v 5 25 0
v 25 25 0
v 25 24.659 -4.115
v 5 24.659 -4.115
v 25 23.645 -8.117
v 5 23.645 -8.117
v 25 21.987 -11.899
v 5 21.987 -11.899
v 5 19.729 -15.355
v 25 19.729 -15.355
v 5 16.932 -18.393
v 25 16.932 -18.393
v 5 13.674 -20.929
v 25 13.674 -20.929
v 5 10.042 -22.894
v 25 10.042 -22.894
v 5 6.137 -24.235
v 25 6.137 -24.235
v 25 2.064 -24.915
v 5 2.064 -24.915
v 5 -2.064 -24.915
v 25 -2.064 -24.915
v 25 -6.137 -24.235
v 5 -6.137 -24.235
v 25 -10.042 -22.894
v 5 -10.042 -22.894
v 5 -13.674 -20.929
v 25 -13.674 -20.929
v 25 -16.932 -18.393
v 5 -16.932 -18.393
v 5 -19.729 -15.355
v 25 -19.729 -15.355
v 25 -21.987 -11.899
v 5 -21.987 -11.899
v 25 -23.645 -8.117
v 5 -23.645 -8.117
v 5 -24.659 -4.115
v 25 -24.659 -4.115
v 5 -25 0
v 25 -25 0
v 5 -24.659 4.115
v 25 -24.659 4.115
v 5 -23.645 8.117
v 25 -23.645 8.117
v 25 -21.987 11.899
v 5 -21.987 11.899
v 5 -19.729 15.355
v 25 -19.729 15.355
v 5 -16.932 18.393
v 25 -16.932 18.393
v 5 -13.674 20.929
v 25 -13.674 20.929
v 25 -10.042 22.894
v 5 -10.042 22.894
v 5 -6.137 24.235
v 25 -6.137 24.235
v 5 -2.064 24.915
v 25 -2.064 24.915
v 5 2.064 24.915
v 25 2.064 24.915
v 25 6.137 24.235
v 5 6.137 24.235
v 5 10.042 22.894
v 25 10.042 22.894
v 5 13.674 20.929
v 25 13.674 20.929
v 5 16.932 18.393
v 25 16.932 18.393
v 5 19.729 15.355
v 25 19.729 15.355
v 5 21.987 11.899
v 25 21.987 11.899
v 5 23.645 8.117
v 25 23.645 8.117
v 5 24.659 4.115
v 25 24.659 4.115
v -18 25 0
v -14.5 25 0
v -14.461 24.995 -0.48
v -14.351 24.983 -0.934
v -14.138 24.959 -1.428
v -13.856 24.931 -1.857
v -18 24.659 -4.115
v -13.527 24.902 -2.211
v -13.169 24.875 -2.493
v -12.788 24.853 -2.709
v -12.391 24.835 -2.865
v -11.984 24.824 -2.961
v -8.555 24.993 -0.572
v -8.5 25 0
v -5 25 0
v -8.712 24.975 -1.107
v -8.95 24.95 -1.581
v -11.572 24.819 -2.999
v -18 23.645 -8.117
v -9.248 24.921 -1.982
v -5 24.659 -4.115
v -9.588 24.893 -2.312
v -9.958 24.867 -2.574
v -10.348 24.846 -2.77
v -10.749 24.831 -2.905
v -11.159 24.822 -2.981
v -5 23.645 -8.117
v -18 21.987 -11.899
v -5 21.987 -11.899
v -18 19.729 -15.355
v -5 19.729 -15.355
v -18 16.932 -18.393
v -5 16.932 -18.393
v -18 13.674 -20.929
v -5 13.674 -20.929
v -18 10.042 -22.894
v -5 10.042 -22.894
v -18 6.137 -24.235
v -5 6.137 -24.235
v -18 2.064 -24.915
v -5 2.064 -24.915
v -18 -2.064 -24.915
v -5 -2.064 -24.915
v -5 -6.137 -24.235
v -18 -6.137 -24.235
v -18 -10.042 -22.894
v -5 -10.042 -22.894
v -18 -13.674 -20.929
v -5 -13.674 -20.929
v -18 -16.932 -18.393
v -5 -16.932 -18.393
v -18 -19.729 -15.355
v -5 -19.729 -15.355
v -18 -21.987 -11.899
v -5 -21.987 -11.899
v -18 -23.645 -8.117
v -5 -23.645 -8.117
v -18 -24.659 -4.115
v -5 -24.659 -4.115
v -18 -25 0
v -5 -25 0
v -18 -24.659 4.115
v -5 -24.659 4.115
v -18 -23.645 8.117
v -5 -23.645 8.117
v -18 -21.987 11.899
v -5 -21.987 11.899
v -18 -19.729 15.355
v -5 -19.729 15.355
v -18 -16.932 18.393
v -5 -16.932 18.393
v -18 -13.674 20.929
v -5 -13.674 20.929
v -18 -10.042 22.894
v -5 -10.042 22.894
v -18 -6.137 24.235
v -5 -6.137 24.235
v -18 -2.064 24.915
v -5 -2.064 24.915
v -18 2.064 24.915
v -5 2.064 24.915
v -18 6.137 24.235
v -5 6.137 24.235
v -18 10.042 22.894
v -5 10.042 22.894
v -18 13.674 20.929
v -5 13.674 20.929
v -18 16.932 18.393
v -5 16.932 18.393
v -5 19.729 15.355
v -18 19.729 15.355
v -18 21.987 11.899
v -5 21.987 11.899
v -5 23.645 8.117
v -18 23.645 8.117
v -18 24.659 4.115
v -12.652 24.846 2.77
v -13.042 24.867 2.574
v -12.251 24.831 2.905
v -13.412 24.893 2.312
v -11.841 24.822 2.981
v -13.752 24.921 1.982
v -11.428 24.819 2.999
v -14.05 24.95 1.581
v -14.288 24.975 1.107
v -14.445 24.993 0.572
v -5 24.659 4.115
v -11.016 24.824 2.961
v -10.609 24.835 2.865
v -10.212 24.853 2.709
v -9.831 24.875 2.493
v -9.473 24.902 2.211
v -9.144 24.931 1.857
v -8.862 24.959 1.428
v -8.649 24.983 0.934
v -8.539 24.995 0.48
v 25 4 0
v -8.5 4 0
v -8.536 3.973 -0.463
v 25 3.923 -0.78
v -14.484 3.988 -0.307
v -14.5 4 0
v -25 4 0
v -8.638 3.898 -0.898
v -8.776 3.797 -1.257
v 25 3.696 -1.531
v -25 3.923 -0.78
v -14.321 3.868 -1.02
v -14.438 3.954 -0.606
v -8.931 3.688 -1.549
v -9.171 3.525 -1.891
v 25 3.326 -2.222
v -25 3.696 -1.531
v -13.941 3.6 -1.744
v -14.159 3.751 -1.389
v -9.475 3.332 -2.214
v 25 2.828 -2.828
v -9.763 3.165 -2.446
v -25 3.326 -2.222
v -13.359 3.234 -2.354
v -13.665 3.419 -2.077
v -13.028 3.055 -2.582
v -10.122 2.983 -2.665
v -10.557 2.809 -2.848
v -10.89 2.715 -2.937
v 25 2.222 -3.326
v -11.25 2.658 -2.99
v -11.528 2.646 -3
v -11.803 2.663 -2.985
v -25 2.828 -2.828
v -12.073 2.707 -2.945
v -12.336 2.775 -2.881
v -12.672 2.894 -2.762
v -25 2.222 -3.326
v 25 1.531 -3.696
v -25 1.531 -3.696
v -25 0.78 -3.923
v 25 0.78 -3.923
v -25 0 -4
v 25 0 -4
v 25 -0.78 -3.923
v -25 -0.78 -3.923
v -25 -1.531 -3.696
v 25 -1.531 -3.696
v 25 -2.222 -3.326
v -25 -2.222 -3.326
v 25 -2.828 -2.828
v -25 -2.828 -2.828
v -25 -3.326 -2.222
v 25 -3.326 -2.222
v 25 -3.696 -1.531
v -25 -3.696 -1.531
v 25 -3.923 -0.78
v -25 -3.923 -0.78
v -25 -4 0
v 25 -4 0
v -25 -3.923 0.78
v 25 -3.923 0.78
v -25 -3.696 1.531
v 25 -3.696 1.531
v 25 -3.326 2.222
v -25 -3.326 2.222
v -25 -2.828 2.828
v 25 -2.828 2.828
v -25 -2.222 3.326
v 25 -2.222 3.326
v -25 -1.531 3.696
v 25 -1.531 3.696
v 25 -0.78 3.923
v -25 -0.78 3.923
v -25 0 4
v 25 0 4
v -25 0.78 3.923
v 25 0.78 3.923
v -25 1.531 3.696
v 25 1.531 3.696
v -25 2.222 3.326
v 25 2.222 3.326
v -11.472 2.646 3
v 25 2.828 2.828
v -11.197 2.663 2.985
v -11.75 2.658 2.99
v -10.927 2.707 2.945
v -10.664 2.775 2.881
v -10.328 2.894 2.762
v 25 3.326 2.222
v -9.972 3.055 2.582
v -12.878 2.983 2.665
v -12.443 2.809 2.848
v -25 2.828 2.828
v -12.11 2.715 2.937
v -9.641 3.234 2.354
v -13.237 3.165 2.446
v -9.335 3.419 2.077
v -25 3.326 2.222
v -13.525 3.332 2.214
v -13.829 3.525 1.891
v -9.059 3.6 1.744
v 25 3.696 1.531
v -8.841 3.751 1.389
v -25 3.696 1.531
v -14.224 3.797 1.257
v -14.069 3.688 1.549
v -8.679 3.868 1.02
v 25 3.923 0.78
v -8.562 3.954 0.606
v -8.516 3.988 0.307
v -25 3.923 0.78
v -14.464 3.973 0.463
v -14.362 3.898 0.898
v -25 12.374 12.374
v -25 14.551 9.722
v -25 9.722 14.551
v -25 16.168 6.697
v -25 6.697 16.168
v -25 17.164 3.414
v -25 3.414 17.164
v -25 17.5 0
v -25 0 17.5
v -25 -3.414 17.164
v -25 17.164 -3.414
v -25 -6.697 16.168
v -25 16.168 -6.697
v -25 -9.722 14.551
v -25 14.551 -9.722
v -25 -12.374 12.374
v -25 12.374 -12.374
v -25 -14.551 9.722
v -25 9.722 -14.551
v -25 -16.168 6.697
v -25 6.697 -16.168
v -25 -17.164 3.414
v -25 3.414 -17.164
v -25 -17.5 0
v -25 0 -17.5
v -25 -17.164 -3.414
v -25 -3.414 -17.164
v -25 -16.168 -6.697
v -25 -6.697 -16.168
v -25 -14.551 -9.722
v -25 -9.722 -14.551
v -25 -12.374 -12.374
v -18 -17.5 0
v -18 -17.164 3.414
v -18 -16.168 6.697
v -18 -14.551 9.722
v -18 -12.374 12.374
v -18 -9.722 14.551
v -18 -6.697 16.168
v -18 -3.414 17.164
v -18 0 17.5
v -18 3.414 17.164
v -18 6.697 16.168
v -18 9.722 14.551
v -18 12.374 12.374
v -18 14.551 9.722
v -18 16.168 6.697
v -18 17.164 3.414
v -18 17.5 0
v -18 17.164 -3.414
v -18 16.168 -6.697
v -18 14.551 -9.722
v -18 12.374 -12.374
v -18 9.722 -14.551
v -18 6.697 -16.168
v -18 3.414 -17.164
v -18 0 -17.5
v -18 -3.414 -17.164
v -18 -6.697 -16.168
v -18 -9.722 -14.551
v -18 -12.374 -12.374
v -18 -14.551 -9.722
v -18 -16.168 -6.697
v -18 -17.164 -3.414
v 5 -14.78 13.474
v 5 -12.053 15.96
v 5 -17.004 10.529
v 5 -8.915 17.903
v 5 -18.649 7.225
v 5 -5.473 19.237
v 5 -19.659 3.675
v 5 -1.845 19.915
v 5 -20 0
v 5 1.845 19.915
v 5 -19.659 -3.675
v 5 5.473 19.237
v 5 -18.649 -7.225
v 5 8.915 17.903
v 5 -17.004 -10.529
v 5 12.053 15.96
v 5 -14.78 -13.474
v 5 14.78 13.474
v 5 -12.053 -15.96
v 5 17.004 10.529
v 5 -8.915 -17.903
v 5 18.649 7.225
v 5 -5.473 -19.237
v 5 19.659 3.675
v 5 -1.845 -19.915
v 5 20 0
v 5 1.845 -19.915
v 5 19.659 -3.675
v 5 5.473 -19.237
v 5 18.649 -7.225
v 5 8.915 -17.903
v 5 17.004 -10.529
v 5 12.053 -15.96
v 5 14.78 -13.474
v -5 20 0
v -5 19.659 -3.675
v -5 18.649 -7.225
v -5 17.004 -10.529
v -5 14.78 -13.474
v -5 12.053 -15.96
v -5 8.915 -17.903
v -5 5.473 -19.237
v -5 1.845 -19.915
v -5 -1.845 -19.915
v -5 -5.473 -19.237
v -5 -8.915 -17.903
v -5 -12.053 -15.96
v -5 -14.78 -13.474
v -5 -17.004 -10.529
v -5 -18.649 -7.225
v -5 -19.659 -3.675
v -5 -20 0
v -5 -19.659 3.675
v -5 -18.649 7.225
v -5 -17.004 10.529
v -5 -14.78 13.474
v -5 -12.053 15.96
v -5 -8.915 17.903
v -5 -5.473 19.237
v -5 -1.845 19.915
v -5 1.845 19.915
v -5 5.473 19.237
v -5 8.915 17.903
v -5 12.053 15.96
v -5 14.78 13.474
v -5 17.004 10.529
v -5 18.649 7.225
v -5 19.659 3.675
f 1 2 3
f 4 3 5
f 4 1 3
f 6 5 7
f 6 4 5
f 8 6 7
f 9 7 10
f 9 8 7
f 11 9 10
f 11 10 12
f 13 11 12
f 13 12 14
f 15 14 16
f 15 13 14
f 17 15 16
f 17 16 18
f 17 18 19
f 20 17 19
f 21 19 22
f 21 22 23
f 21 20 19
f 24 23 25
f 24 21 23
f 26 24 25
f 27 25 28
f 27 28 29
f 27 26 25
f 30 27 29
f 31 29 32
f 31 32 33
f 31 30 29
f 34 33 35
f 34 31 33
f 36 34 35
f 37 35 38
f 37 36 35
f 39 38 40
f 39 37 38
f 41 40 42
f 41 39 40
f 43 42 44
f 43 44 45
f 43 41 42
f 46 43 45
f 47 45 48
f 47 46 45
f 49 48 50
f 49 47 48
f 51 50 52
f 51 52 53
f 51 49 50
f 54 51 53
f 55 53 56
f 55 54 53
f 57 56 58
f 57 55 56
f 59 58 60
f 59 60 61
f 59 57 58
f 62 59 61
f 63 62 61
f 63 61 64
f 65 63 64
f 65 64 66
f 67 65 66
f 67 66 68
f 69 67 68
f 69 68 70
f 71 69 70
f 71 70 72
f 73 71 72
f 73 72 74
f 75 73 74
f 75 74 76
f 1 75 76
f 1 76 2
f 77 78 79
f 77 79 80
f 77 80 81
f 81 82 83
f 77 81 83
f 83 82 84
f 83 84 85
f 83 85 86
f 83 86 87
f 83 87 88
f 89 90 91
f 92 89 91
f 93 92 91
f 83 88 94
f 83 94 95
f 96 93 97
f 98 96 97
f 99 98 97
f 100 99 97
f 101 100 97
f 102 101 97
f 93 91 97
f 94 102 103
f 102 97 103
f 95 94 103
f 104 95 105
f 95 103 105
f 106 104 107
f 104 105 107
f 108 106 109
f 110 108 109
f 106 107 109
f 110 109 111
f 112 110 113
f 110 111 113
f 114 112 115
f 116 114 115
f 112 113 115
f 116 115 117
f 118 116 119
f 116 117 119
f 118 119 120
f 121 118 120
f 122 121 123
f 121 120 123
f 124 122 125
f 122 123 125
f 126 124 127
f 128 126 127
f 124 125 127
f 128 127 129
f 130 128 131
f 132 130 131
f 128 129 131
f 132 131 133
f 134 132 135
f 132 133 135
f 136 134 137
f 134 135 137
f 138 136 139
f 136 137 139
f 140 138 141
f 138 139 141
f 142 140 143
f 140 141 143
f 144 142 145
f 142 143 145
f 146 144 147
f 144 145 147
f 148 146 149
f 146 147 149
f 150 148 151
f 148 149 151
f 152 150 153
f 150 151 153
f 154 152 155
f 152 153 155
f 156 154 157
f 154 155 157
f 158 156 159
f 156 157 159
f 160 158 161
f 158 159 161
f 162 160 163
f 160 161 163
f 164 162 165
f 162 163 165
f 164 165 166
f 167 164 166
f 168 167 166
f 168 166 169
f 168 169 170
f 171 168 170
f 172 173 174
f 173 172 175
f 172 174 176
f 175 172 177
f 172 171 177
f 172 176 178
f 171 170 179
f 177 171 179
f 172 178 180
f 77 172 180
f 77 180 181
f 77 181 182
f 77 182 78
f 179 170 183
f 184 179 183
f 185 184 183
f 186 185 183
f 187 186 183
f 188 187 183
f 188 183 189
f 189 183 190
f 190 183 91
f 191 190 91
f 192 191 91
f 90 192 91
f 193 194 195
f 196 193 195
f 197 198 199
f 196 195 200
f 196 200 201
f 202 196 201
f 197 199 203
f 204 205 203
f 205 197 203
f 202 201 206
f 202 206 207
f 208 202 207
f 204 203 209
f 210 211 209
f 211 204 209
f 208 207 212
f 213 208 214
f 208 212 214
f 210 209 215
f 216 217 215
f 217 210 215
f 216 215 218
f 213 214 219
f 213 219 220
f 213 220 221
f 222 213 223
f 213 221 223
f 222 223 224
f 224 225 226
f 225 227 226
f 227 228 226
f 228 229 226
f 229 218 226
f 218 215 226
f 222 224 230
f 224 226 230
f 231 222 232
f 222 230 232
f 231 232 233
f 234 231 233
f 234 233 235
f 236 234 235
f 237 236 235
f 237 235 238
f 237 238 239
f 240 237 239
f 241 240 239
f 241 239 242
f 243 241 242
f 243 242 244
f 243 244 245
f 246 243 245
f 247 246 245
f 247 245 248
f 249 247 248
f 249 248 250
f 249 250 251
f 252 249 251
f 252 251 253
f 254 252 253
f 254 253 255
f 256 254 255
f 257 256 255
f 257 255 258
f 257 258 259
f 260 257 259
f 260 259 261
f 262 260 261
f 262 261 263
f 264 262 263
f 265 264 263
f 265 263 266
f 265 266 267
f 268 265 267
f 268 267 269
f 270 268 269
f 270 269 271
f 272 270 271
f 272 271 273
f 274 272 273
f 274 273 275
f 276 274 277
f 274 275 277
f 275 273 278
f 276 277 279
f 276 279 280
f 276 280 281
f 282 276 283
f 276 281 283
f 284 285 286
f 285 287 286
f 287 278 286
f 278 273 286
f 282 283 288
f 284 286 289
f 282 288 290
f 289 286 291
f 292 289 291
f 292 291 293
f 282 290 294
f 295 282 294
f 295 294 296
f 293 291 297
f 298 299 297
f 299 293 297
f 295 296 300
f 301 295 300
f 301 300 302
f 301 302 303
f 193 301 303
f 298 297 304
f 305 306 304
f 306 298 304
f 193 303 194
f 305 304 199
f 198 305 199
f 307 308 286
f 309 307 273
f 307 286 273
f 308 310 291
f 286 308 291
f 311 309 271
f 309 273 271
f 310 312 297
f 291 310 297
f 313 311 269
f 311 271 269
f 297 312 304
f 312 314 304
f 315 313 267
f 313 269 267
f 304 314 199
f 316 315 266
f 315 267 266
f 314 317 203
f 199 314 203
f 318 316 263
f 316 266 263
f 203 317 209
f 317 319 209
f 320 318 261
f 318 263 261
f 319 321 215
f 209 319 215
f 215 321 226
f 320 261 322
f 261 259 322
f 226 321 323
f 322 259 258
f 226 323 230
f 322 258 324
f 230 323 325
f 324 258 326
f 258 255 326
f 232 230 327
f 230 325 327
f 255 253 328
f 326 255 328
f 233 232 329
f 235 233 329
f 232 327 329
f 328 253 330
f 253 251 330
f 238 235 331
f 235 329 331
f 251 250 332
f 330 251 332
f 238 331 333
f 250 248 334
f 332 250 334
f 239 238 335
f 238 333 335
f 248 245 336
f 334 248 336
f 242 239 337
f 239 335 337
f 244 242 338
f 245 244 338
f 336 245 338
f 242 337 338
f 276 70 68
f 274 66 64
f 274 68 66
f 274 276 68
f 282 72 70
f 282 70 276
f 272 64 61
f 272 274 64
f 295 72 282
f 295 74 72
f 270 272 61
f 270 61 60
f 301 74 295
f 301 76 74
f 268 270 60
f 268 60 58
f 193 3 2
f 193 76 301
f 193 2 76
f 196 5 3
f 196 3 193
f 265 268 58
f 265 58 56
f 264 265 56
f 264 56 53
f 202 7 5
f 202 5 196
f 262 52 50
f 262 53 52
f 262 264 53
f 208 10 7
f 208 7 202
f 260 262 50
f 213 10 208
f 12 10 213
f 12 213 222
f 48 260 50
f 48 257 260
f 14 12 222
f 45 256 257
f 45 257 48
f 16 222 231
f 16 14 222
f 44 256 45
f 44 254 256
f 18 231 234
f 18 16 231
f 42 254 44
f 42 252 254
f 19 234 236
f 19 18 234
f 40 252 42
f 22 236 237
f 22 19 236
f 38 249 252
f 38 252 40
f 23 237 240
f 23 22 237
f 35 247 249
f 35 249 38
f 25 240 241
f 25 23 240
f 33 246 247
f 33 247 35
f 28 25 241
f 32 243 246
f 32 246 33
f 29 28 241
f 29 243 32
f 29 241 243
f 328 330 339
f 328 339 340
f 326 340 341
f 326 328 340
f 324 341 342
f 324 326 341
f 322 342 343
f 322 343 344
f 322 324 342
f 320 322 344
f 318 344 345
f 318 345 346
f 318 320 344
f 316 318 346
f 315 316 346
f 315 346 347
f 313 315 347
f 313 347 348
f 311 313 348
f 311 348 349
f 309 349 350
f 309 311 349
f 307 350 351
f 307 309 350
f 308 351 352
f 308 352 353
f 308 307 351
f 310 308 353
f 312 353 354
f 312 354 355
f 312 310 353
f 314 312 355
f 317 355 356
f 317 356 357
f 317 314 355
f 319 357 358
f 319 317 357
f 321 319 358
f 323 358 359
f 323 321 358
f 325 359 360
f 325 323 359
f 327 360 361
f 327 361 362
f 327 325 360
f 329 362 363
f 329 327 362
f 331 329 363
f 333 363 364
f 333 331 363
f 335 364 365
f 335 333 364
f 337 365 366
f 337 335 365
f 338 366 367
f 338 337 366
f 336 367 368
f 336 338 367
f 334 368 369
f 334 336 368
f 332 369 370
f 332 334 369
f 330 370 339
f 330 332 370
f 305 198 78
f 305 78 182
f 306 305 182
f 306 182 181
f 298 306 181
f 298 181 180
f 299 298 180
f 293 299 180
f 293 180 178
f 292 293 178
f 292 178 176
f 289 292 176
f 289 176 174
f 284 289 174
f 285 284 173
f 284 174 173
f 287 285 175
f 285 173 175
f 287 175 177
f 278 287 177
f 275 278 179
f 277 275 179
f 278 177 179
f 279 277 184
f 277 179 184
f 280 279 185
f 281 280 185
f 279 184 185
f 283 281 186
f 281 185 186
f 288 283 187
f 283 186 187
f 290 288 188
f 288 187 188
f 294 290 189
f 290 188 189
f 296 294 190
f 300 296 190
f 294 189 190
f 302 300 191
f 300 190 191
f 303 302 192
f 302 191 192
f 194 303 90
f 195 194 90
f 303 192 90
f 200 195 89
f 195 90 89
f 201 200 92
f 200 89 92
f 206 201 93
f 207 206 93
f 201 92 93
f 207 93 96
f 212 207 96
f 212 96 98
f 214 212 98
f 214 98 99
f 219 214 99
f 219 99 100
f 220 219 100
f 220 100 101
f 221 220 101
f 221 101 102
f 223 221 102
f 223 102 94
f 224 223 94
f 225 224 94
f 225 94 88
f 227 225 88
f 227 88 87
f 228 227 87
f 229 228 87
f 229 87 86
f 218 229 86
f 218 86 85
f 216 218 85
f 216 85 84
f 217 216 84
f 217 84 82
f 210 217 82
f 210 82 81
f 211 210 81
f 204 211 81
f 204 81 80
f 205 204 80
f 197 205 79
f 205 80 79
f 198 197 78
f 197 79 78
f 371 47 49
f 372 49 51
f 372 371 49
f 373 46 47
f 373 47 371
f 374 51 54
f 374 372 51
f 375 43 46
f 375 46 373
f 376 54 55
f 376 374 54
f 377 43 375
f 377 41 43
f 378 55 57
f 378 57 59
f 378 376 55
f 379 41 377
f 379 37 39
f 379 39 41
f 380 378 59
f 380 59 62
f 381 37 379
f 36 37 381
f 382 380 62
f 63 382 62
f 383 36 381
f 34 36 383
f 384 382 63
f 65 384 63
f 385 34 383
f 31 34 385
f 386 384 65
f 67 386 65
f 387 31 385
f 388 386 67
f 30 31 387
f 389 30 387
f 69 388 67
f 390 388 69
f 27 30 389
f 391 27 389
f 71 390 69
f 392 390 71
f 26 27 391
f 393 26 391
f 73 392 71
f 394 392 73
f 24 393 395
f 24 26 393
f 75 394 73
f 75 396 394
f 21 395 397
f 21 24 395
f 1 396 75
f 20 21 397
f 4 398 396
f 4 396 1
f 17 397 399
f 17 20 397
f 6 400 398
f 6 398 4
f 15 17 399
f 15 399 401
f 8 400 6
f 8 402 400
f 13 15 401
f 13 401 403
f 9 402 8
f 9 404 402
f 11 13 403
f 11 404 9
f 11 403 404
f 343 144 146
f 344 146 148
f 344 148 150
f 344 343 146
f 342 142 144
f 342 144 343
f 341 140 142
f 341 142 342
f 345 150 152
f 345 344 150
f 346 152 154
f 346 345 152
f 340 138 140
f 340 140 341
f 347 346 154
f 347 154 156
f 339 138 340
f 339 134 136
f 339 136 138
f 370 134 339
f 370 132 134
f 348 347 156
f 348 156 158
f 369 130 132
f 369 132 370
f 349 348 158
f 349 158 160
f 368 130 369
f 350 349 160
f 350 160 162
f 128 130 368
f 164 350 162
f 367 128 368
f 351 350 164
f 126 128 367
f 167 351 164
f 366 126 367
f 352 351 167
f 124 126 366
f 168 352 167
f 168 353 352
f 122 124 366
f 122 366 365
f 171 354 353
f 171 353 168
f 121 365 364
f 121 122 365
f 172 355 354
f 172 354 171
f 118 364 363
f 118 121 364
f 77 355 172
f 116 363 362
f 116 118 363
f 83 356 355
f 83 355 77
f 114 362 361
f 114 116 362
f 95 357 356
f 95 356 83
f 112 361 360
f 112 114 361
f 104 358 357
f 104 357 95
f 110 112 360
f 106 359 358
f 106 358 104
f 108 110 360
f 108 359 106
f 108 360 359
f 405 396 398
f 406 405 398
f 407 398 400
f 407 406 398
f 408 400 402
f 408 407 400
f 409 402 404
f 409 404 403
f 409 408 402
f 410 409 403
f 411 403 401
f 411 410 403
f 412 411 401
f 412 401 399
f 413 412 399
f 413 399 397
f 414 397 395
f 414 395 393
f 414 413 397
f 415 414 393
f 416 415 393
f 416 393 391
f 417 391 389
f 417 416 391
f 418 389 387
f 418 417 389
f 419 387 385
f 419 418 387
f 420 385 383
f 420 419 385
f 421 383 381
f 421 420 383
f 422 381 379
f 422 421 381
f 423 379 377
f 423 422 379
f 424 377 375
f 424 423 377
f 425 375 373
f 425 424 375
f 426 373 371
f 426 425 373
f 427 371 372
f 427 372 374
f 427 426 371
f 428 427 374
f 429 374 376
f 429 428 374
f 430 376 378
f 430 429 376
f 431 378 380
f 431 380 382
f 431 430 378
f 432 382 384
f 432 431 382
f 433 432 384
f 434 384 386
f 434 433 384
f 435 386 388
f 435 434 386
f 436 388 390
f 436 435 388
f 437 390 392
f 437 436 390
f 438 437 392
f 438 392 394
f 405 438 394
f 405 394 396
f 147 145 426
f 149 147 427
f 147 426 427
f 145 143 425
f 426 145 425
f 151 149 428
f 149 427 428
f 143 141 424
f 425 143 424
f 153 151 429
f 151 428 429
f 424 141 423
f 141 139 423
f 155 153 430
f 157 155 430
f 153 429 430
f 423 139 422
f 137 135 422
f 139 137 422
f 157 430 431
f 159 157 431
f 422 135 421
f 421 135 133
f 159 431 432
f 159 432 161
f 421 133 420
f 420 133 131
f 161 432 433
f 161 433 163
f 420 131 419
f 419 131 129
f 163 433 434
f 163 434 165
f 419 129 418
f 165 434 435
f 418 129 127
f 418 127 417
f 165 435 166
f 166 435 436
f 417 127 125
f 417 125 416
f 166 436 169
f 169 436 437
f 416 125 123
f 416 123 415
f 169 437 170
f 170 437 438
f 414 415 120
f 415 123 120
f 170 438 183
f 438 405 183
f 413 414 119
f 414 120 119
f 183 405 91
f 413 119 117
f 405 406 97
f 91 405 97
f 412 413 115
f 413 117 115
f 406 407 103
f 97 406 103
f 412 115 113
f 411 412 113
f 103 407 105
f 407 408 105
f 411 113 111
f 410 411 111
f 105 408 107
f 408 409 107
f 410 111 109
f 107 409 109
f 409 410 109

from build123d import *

# Parameters (mm, degrees)
SKETCH2_R          = 25
SKETCH2_R_2        = 17.5
CUT_EXTRUDE1_DEPTH = 7
SKETCH3_R          = 3
CUT_EXTRUDE2_DEPTH = 25


with BuildPart() as part:
    # Sketch1 → Revolve1 (revolve)
    with BuildSketch(Plane.XY):
        Polygon((0, 20), (0, 4), (25, 4), (25, 25), (5, 25), (5, 20), align=None)
    revolve(axis=Axis((25, 0, 0), (-1, 0, 0)))

    # Mirror1: part across plane


with BuildPart() as part_1:
    add(part.part)
    add(part.part.mirror(Plane(origin=(0, 0, 0), x_dir=(0, 0, 1), z_dir=(1, 0, 0))))

    # Sketch2 → Cut-Extrude1 (cut)
    with BuildSketch(Plane.ZY.offset(25)):
        with Locations(Location((0, 0, 0), (0, 0, 90))):
            Circle(SKETCH2_R)
        with Locations(Location((0, 0, 0), (0, 0, 270))):
            Circle(SKETCH2_R_2, mode=Mode.SUBTRACT)
    extrude(amount=-CUT_EXTRUDE1_DEPTH, mode=Mode.SUBTRACT)

    # Sketch3 → Cut-Extrude2 (cut)
    with BuildSketch(Plane(origin=(0, 25, 0), x_dir=(1, 0, 0), z_dir=(0, 1, 0))):
        with Locations(Location((-11.5, 0, 0), (0, 0, 180))):
            Circle(SKETCH3_R)
    extrude(amount=-CUT_EXTRUDE2_DEPTH, mode=Mode.SUBTRACT)


solid = part_1.part
